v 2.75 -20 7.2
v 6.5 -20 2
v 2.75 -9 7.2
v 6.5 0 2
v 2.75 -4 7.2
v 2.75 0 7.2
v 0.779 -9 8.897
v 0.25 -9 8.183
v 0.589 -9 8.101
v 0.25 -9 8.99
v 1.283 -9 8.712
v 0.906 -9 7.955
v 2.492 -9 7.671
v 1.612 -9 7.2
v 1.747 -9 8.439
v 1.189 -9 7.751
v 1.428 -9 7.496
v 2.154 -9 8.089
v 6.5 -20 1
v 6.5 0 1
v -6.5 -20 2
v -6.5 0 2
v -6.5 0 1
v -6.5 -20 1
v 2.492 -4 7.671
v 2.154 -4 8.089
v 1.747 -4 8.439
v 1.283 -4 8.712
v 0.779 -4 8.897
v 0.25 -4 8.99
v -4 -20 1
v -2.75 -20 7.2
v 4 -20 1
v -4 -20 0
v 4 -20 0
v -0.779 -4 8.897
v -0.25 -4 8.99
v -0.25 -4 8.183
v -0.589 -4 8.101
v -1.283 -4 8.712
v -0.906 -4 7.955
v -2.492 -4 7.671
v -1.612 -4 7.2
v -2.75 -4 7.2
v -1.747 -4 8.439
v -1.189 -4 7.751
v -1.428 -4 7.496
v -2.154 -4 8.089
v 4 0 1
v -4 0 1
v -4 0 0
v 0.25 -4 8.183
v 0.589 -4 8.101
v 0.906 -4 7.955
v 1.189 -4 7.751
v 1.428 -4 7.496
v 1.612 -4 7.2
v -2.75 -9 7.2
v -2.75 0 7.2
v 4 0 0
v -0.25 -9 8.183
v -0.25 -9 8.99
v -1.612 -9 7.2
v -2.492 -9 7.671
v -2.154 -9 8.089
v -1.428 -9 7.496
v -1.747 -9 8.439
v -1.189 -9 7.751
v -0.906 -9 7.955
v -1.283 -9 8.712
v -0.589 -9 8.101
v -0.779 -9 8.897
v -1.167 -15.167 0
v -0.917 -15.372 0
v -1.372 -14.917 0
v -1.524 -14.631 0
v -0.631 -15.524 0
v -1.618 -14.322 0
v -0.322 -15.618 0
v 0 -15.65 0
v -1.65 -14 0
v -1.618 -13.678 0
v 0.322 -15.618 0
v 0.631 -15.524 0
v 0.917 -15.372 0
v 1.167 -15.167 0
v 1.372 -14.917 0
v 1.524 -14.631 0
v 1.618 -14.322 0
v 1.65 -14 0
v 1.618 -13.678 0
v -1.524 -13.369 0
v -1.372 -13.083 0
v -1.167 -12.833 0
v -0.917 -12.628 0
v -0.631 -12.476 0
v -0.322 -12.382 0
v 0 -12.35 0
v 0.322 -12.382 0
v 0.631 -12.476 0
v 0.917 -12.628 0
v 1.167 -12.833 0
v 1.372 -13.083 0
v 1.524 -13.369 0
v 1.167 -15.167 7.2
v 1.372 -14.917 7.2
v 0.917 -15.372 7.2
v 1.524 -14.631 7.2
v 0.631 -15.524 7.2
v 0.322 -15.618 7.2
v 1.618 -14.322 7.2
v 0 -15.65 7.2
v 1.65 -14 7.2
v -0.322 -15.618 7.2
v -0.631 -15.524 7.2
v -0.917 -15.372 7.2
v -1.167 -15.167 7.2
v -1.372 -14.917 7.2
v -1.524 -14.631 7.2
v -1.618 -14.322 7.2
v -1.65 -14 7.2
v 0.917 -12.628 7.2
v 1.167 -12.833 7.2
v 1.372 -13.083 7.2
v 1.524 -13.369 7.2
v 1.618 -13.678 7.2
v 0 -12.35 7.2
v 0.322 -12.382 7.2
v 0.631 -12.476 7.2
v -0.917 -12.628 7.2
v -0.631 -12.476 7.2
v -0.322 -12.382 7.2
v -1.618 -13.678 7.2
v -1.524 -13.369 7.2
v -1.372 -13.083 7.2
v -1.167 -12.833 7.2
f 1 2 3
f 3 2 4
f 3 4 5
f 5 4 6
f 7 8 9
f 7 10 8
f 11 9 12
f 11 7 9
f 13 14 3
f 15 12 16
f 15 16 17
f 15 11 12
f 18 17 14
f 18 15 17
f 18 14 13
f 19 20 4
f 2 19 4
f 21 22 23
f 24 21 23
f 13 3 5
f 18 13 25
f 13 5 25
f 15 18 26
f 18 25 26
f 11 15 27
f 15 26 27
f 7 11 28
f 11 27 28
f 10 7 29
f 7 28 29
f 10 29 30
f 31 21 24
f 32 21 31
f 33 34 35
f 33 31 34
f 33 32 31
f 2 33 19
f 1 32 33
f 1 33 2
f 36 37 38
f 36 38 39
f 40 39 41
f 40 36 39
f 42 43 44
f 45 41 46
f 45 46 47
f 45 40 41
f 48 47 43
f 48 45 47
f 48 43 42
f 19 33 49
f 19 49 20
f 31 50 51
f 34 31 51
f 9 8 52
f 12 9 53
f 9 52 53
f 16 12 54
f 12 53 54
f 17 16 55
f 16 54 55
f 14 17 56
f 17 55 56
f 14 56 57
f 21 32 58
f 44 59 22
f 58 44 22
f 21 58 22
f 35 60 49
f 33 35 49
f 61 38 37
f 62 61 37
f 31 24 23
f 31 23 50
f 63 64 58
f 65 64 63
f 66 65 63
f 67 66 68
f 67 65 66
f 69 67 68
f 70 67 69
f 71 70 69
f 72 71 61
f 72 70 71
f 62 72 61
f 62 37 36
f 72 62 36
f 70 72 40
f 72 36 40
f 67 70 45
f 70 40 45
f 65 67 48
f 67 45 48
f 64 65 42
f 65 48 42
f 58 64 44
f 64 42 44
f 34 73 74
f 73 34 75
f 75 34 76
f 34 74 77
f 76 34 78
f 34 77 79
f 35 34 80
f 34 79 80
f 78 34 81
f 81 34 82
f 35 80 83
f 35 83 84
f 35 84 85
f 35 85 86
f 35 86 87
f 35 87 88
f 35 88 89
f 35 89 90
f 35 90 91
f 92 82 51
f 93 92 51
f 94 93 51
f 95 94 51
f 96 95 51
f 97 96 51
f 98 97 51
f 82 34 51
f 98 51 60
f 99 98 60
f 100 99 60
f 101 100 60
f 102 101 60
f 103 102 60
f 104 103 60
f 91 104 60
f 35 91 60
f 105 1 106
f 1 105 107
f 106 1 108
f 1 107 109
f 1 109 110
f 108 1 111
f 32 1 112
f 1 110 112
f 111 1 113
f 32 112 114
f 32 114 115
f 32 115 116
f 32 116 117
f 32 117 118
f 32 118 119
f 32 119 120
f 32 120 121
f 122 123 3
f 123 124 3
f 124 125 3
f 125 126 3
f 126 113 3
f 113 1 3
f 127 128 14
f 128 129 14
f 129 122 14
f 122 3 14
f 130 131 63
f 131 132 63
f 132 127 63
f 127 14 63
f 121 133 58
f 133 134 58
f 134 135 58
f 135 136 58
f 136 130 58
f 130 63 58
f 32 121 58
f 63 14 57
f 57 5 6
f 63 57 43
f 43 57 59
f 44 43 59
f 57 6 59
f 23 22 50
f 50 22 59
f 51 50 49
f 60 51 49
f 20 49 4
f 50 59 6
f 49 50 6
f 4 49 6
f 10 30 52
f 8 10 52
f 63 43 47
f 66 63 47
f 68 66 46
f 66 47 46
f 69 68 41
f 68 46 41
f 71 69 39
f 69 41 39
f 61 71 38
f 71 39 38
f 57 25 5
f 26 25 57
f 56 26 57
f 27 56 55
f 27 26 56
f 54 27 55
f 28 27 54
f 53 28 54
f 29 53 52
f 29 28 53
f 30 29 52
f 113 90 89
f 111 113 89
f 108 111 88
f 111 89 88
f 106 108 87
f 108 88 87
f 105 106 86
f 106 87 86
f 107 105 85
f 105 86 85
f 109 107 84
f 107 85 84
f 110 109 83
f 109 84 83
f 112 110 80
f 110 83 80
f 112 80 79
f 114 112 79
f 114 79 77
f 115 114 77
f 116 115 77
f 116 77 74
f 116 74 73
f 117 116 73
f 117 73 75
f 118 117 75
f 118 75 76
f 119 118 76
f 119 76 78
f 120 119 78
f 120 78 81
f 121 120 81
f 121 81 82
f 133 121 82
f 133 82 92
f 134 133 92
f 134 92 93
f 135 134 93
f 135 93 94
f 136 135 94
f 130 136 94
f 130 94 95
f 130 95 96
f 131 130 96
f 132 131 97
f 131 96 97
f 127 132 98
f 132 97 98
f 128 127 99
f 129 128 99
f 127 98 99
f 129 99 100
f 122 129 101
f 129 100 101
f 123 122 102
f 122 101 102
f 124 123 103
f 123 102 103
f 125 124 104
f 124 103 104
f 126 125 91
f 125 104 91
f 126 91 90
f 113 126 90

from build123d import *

# Parameters (mm, degrees)
F1_DEPTH = 20
F2_R     = 1.65
F3_DEPTH = 7.201
F5_DEPTH = 9
F7_DEPTH = 4
F9_DEPTH = 16.001


with BuildPart() as f1:
    # F0 (on Front) → F1 (new body)
    with BuildSketch(Plane.XZ):
        Polygon((-4, 0), (0, 0), (4, 0), (4, 1), (6.5, 1), (6.5, 2), (2.75, 7.2), (0, 7.2), (-2.75, 7.2), (-6.5, 2), (-6.5, 1), (-4, 1), align=None)
    extrude(amount=F1_DEPTH)

    # F2 (on face) → F3 (cut, through all)
    with BuildSketch(Plane(origin=(0, 0, 0), x_dir=(1, 0, 0), z_dir=(0, 0, -1))):
        with Locations((0, 14)):
            Circle(F2_R)
    extrude(amount=-F3_DEPTH, mode=Mode.SUBTRACT)

    # F4 (on Front) → F5 (join)
    with BuildSketch(Plane.XZ):
        with BuildLine():
            Line((1.6124515497, 7.2), (2.75, 7.2))
            ThreePointArc((2.75, 7.2), (0, 9), (-2.75, 7.2))
            Line((-2.75, 7.2), (-1.6124515497, 7.2))
            ThreePointArc((-1.6124515497, 7.2), (0, 8.2), (1.6124515497, 7.2))
        make_face()
    extrude(amount=F5_DEPTH)

    # F6 (on face) → F7 (cut)
    with BuildSketch(Plane(origin=(0, 0, 0), x_dir=(-1, 0, 0), z_dir=(0, 1, 0))):
        with BuildLine():
            ThreePointArc((2.75, 7.2), (0, 9), (-2.75, 7.2))
            Line((-2.75, 7.2), (-1.6124515497, 7.2))
            ThreePointArc((-1.6124515497, 7.2), (0, 8.2), (1.6124515497, 7.2))
            Line((1.6124515497, 7.2), (2.75, 7.2))
        make_face()
    extrude(amount=-F7_DEPTH, mode=Mode.SUBTRACT)

    # F8 (on face) → F9 (cut, through all)
    with BuildSketch(Plane(origin=(0, -4, 0), x_dir=(-1, 0, 0), z_dir=(0, 1, 0))):
        with BuildLine():
            Line((-0.25, 8.9895676091), (-0.25, 8.182554347))
            ThreePointArc((-0.25, 8.182554347), (0, 8.2), (0.25, 8.182554347))
            Line((0.25, 8.182554347), (0.25, 8.9895676091))
            ThreePointArc((0.25, 8.9895676091), (0, 9), (-0.25, 8.9895676091))
        make_face()
    extrude(amount=-F9_DEPTH, mode=Mode.SUBTRACT)


solid = f1.part
